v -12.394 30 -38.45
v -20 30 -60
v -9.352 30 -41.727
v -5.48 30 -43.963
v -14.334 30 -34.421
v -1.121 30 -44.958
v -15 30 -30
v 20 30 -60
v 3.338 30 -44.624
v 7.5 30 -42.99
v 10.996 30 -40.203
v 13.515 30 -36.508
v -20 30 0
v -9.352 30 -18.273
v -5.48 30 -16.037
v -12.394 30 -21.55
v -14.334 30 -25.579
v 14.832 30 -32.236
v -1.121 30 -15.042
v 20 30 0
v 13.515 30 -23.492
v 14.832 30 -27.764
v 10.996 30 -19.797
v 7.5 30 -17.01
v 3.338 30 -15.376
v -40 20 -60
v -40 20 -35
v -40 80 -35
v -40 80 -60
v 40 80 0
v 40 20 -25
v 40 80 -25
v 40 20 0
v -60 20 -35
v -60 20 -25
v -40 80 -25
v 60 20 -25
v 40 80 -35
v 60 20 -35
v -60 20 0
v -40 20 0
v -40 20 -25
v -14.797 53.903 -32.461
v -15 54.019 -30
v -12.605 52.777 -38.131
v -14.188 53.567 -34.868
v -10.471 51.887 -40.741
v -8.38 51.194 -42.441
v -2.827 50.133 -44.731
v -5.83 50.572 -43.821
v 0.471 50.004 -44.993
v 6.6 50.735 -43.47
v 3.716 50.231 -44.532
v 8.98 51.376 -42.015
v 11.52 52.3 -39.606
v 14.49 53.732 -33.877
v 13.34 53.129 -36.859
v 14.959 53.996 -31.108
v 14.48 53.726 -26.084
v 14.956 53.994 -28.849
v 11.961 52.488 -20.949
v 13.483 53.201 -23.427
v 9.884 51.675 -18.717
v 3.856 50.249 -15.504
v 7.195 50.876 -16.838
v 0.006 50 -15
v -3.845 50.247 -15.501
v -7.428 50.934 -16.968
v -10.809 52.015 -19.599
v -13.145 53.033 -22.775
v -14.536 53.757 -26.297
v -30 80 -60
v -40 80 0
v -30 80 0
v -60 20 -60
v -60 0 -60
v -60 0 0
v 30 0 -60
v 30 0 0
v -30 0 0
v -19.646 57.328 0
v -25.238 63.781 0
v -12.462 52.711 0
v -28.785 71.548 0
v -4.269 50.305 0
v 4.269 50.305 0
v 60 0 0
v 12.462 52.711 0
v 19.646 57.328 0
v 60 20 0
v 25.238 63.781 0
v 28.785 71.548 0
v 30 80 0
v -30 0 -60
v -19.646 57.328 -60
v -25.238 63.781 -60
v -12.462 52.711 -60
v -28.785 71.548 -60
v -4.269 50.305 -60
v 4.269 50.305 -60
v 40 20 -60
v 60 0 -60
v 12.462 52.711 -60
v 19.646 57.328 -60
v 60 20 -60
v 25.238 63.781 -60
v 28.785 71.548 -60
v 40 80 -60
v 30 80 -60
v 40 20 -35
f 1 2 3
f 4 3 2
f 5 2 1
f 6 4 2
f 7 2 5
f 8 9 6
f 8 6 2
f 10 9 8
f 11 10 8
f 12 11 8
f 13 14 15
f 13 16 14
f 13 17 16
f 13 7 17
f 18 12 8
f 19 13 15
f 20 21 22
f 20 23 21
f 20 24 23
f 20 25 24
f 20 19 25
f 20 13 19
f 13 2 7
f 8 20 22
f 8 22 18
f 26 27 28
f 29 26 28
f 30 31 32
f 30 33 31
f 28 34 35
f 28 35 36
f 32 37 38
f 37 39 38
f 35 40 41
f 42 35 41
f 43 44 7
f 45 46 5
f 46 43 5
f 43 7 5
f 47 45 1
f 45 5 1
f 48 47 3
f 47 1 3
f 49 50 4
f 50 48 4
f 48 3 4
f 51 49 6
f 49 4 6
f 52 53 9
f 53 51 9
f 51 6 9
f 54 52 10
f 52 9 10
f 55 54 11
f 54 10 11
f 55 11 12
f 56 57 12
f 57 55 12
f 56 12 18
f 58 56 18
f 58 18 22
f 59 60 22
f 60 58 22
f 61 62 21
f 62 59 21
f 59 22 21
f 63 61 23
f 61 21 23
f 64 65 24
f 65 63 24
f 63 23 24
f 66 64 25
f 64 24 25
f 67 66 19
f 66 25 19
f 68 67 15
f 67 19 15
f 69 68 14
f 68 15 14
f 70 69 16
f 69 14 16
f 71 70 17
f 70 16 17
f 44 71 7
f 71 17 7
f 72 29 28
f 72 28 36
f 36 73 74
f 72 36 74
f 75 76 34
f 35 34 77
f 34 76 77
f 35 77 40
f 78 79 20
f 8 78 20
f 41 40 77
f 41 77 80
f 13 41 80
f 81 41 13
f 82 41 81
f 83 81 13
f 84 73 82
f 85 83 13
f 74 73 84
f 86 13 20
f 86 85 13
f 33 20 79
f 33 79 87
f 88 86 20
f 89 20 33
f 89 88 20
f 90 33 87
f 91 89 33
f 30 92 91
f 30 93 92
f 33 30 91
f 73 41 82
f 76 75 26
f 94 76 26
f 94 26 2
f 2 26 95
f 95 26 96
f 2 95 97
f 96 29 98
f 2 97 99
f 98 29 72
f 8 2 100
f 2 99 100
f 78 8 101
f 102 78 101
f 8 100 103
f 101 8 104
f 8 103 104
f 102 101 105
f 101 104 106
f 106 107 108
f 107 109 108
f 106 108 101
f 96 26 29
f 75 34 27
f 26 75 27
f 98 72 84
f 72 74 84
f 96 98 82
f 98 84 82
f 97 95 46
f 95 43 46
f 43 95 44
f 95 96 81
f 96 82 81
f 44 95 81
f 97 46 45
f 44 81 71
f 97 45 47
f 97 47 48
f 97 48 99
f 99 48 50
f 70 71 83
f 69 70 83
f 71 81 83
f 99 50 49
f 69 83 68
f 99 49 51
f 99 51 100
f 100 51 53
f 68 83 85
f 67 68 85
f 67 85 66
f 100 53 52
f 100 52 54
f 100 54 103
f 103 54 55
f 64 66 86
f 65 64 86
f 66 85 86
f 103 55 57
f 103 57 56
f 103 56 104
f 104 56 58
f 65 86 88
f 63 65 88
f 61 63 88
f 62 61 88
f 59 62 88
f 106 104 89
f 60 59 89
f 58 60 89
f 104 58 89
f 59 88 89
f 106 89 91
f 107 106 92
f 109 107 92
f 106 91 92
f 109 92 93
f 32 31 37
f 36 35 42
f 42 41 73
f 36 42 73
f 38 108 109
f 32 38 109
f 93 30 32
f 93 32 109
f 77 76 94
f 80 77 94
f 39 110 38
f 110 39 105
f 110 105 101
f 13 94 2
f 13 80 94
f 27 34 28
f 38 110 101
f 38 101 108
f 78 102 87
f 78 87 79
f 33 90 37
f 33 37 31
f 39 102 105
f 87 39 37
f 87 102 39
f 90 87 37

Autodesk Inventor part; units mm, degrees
ref_plane "YZ Plane" through (0, 0, 0) normal (1, 0, 0) x (0, 1, 0)
ref_plane "XZ Plane" through (0, 0, 0) normal (0, 1, 0) x (-1, 0, 0)
sketch "Эскиз1" plane through (0, 0, 0) normal (0, 0, 1) x (1, 0, 0)
  line L0 (-60, 0) -> (-60, 20)
  line L1 (-60, 20) -> (-40, 20)
  line L2 (-40, 20) -> (-40, 80)
  line L3 (-40, 80) -> (-30, 80)
  line L4 (-30, 0) -> (-20, 30)
  line L5 (-20, 30) -> (20, 30)
  line L6 (30, 0) -> (20, 30)
  line L7 (-60, 0) -> (-30, 0)
  line L8 (60, 0) -> (60, 20)
  line L9 (60, 20) -> (40, 20)
  line L10 (40, 20) -> (40, 80)
  line L11 (40, 80) -> (30, 80)
  line L12 (30, 0) -> (20, 30)
  line L13 (20, 30) -> (-20, 30)
  line L14 (60, 0) -> (30, 0)
  arc A0 (-30, 80) -> (30, 80) centre (0, 80) ccw
  point P0 (0, 0)
extrude "Выдавливание1" add sketch "Эскиз1" against normal blind 60
sketch "Эскиз3" plane through (0, 0, 0) normal (0, 1, 0) x (-1, 0, 0)
  line L0 (-20, -60) -> (20, -60) projected
  circle A0 centre (0, -30) radius 15
  point P0 (0, 0)
  dimension "d16" = 30
extrude "Выдавливание2" cut sketch "Эскиз3" along normal mid plane 1000
ref_plane "РабПлоскость1" through (0, 0, -30) normal (0, 0, 1) x (1, 0, 0)
sketch "Эскиз4" plane through (0, 0, -30) normal (0, 0, 1) x (1, 0, 0)
  line L0 (60, 0) -> (60, 20) projected
  line L1 (40, 80) -> (30, 80) projected
  line L2 (0, 0) -> (0, 80)
  line L3 (-60, 20) -> (-40, 80)
  line L4 (-60, 0) -> (-60, 20) projected
  line L5 (-60, 20) -> (-40, 20)
  line L6 (-40, 20) -> (-40, 80) projected
  line L7 (-40, 20) -> (-40, 80)
  line L8 (60, 20) -> (40, 80)
  line L9 (60, 20) -> (40, 20)
  line L10 (40, 20) -> (40, 80)
extrude "Выдавливание3" add sketch "Эскиз4" along normal mid plane 10
properties part number "ПЧ2021"
